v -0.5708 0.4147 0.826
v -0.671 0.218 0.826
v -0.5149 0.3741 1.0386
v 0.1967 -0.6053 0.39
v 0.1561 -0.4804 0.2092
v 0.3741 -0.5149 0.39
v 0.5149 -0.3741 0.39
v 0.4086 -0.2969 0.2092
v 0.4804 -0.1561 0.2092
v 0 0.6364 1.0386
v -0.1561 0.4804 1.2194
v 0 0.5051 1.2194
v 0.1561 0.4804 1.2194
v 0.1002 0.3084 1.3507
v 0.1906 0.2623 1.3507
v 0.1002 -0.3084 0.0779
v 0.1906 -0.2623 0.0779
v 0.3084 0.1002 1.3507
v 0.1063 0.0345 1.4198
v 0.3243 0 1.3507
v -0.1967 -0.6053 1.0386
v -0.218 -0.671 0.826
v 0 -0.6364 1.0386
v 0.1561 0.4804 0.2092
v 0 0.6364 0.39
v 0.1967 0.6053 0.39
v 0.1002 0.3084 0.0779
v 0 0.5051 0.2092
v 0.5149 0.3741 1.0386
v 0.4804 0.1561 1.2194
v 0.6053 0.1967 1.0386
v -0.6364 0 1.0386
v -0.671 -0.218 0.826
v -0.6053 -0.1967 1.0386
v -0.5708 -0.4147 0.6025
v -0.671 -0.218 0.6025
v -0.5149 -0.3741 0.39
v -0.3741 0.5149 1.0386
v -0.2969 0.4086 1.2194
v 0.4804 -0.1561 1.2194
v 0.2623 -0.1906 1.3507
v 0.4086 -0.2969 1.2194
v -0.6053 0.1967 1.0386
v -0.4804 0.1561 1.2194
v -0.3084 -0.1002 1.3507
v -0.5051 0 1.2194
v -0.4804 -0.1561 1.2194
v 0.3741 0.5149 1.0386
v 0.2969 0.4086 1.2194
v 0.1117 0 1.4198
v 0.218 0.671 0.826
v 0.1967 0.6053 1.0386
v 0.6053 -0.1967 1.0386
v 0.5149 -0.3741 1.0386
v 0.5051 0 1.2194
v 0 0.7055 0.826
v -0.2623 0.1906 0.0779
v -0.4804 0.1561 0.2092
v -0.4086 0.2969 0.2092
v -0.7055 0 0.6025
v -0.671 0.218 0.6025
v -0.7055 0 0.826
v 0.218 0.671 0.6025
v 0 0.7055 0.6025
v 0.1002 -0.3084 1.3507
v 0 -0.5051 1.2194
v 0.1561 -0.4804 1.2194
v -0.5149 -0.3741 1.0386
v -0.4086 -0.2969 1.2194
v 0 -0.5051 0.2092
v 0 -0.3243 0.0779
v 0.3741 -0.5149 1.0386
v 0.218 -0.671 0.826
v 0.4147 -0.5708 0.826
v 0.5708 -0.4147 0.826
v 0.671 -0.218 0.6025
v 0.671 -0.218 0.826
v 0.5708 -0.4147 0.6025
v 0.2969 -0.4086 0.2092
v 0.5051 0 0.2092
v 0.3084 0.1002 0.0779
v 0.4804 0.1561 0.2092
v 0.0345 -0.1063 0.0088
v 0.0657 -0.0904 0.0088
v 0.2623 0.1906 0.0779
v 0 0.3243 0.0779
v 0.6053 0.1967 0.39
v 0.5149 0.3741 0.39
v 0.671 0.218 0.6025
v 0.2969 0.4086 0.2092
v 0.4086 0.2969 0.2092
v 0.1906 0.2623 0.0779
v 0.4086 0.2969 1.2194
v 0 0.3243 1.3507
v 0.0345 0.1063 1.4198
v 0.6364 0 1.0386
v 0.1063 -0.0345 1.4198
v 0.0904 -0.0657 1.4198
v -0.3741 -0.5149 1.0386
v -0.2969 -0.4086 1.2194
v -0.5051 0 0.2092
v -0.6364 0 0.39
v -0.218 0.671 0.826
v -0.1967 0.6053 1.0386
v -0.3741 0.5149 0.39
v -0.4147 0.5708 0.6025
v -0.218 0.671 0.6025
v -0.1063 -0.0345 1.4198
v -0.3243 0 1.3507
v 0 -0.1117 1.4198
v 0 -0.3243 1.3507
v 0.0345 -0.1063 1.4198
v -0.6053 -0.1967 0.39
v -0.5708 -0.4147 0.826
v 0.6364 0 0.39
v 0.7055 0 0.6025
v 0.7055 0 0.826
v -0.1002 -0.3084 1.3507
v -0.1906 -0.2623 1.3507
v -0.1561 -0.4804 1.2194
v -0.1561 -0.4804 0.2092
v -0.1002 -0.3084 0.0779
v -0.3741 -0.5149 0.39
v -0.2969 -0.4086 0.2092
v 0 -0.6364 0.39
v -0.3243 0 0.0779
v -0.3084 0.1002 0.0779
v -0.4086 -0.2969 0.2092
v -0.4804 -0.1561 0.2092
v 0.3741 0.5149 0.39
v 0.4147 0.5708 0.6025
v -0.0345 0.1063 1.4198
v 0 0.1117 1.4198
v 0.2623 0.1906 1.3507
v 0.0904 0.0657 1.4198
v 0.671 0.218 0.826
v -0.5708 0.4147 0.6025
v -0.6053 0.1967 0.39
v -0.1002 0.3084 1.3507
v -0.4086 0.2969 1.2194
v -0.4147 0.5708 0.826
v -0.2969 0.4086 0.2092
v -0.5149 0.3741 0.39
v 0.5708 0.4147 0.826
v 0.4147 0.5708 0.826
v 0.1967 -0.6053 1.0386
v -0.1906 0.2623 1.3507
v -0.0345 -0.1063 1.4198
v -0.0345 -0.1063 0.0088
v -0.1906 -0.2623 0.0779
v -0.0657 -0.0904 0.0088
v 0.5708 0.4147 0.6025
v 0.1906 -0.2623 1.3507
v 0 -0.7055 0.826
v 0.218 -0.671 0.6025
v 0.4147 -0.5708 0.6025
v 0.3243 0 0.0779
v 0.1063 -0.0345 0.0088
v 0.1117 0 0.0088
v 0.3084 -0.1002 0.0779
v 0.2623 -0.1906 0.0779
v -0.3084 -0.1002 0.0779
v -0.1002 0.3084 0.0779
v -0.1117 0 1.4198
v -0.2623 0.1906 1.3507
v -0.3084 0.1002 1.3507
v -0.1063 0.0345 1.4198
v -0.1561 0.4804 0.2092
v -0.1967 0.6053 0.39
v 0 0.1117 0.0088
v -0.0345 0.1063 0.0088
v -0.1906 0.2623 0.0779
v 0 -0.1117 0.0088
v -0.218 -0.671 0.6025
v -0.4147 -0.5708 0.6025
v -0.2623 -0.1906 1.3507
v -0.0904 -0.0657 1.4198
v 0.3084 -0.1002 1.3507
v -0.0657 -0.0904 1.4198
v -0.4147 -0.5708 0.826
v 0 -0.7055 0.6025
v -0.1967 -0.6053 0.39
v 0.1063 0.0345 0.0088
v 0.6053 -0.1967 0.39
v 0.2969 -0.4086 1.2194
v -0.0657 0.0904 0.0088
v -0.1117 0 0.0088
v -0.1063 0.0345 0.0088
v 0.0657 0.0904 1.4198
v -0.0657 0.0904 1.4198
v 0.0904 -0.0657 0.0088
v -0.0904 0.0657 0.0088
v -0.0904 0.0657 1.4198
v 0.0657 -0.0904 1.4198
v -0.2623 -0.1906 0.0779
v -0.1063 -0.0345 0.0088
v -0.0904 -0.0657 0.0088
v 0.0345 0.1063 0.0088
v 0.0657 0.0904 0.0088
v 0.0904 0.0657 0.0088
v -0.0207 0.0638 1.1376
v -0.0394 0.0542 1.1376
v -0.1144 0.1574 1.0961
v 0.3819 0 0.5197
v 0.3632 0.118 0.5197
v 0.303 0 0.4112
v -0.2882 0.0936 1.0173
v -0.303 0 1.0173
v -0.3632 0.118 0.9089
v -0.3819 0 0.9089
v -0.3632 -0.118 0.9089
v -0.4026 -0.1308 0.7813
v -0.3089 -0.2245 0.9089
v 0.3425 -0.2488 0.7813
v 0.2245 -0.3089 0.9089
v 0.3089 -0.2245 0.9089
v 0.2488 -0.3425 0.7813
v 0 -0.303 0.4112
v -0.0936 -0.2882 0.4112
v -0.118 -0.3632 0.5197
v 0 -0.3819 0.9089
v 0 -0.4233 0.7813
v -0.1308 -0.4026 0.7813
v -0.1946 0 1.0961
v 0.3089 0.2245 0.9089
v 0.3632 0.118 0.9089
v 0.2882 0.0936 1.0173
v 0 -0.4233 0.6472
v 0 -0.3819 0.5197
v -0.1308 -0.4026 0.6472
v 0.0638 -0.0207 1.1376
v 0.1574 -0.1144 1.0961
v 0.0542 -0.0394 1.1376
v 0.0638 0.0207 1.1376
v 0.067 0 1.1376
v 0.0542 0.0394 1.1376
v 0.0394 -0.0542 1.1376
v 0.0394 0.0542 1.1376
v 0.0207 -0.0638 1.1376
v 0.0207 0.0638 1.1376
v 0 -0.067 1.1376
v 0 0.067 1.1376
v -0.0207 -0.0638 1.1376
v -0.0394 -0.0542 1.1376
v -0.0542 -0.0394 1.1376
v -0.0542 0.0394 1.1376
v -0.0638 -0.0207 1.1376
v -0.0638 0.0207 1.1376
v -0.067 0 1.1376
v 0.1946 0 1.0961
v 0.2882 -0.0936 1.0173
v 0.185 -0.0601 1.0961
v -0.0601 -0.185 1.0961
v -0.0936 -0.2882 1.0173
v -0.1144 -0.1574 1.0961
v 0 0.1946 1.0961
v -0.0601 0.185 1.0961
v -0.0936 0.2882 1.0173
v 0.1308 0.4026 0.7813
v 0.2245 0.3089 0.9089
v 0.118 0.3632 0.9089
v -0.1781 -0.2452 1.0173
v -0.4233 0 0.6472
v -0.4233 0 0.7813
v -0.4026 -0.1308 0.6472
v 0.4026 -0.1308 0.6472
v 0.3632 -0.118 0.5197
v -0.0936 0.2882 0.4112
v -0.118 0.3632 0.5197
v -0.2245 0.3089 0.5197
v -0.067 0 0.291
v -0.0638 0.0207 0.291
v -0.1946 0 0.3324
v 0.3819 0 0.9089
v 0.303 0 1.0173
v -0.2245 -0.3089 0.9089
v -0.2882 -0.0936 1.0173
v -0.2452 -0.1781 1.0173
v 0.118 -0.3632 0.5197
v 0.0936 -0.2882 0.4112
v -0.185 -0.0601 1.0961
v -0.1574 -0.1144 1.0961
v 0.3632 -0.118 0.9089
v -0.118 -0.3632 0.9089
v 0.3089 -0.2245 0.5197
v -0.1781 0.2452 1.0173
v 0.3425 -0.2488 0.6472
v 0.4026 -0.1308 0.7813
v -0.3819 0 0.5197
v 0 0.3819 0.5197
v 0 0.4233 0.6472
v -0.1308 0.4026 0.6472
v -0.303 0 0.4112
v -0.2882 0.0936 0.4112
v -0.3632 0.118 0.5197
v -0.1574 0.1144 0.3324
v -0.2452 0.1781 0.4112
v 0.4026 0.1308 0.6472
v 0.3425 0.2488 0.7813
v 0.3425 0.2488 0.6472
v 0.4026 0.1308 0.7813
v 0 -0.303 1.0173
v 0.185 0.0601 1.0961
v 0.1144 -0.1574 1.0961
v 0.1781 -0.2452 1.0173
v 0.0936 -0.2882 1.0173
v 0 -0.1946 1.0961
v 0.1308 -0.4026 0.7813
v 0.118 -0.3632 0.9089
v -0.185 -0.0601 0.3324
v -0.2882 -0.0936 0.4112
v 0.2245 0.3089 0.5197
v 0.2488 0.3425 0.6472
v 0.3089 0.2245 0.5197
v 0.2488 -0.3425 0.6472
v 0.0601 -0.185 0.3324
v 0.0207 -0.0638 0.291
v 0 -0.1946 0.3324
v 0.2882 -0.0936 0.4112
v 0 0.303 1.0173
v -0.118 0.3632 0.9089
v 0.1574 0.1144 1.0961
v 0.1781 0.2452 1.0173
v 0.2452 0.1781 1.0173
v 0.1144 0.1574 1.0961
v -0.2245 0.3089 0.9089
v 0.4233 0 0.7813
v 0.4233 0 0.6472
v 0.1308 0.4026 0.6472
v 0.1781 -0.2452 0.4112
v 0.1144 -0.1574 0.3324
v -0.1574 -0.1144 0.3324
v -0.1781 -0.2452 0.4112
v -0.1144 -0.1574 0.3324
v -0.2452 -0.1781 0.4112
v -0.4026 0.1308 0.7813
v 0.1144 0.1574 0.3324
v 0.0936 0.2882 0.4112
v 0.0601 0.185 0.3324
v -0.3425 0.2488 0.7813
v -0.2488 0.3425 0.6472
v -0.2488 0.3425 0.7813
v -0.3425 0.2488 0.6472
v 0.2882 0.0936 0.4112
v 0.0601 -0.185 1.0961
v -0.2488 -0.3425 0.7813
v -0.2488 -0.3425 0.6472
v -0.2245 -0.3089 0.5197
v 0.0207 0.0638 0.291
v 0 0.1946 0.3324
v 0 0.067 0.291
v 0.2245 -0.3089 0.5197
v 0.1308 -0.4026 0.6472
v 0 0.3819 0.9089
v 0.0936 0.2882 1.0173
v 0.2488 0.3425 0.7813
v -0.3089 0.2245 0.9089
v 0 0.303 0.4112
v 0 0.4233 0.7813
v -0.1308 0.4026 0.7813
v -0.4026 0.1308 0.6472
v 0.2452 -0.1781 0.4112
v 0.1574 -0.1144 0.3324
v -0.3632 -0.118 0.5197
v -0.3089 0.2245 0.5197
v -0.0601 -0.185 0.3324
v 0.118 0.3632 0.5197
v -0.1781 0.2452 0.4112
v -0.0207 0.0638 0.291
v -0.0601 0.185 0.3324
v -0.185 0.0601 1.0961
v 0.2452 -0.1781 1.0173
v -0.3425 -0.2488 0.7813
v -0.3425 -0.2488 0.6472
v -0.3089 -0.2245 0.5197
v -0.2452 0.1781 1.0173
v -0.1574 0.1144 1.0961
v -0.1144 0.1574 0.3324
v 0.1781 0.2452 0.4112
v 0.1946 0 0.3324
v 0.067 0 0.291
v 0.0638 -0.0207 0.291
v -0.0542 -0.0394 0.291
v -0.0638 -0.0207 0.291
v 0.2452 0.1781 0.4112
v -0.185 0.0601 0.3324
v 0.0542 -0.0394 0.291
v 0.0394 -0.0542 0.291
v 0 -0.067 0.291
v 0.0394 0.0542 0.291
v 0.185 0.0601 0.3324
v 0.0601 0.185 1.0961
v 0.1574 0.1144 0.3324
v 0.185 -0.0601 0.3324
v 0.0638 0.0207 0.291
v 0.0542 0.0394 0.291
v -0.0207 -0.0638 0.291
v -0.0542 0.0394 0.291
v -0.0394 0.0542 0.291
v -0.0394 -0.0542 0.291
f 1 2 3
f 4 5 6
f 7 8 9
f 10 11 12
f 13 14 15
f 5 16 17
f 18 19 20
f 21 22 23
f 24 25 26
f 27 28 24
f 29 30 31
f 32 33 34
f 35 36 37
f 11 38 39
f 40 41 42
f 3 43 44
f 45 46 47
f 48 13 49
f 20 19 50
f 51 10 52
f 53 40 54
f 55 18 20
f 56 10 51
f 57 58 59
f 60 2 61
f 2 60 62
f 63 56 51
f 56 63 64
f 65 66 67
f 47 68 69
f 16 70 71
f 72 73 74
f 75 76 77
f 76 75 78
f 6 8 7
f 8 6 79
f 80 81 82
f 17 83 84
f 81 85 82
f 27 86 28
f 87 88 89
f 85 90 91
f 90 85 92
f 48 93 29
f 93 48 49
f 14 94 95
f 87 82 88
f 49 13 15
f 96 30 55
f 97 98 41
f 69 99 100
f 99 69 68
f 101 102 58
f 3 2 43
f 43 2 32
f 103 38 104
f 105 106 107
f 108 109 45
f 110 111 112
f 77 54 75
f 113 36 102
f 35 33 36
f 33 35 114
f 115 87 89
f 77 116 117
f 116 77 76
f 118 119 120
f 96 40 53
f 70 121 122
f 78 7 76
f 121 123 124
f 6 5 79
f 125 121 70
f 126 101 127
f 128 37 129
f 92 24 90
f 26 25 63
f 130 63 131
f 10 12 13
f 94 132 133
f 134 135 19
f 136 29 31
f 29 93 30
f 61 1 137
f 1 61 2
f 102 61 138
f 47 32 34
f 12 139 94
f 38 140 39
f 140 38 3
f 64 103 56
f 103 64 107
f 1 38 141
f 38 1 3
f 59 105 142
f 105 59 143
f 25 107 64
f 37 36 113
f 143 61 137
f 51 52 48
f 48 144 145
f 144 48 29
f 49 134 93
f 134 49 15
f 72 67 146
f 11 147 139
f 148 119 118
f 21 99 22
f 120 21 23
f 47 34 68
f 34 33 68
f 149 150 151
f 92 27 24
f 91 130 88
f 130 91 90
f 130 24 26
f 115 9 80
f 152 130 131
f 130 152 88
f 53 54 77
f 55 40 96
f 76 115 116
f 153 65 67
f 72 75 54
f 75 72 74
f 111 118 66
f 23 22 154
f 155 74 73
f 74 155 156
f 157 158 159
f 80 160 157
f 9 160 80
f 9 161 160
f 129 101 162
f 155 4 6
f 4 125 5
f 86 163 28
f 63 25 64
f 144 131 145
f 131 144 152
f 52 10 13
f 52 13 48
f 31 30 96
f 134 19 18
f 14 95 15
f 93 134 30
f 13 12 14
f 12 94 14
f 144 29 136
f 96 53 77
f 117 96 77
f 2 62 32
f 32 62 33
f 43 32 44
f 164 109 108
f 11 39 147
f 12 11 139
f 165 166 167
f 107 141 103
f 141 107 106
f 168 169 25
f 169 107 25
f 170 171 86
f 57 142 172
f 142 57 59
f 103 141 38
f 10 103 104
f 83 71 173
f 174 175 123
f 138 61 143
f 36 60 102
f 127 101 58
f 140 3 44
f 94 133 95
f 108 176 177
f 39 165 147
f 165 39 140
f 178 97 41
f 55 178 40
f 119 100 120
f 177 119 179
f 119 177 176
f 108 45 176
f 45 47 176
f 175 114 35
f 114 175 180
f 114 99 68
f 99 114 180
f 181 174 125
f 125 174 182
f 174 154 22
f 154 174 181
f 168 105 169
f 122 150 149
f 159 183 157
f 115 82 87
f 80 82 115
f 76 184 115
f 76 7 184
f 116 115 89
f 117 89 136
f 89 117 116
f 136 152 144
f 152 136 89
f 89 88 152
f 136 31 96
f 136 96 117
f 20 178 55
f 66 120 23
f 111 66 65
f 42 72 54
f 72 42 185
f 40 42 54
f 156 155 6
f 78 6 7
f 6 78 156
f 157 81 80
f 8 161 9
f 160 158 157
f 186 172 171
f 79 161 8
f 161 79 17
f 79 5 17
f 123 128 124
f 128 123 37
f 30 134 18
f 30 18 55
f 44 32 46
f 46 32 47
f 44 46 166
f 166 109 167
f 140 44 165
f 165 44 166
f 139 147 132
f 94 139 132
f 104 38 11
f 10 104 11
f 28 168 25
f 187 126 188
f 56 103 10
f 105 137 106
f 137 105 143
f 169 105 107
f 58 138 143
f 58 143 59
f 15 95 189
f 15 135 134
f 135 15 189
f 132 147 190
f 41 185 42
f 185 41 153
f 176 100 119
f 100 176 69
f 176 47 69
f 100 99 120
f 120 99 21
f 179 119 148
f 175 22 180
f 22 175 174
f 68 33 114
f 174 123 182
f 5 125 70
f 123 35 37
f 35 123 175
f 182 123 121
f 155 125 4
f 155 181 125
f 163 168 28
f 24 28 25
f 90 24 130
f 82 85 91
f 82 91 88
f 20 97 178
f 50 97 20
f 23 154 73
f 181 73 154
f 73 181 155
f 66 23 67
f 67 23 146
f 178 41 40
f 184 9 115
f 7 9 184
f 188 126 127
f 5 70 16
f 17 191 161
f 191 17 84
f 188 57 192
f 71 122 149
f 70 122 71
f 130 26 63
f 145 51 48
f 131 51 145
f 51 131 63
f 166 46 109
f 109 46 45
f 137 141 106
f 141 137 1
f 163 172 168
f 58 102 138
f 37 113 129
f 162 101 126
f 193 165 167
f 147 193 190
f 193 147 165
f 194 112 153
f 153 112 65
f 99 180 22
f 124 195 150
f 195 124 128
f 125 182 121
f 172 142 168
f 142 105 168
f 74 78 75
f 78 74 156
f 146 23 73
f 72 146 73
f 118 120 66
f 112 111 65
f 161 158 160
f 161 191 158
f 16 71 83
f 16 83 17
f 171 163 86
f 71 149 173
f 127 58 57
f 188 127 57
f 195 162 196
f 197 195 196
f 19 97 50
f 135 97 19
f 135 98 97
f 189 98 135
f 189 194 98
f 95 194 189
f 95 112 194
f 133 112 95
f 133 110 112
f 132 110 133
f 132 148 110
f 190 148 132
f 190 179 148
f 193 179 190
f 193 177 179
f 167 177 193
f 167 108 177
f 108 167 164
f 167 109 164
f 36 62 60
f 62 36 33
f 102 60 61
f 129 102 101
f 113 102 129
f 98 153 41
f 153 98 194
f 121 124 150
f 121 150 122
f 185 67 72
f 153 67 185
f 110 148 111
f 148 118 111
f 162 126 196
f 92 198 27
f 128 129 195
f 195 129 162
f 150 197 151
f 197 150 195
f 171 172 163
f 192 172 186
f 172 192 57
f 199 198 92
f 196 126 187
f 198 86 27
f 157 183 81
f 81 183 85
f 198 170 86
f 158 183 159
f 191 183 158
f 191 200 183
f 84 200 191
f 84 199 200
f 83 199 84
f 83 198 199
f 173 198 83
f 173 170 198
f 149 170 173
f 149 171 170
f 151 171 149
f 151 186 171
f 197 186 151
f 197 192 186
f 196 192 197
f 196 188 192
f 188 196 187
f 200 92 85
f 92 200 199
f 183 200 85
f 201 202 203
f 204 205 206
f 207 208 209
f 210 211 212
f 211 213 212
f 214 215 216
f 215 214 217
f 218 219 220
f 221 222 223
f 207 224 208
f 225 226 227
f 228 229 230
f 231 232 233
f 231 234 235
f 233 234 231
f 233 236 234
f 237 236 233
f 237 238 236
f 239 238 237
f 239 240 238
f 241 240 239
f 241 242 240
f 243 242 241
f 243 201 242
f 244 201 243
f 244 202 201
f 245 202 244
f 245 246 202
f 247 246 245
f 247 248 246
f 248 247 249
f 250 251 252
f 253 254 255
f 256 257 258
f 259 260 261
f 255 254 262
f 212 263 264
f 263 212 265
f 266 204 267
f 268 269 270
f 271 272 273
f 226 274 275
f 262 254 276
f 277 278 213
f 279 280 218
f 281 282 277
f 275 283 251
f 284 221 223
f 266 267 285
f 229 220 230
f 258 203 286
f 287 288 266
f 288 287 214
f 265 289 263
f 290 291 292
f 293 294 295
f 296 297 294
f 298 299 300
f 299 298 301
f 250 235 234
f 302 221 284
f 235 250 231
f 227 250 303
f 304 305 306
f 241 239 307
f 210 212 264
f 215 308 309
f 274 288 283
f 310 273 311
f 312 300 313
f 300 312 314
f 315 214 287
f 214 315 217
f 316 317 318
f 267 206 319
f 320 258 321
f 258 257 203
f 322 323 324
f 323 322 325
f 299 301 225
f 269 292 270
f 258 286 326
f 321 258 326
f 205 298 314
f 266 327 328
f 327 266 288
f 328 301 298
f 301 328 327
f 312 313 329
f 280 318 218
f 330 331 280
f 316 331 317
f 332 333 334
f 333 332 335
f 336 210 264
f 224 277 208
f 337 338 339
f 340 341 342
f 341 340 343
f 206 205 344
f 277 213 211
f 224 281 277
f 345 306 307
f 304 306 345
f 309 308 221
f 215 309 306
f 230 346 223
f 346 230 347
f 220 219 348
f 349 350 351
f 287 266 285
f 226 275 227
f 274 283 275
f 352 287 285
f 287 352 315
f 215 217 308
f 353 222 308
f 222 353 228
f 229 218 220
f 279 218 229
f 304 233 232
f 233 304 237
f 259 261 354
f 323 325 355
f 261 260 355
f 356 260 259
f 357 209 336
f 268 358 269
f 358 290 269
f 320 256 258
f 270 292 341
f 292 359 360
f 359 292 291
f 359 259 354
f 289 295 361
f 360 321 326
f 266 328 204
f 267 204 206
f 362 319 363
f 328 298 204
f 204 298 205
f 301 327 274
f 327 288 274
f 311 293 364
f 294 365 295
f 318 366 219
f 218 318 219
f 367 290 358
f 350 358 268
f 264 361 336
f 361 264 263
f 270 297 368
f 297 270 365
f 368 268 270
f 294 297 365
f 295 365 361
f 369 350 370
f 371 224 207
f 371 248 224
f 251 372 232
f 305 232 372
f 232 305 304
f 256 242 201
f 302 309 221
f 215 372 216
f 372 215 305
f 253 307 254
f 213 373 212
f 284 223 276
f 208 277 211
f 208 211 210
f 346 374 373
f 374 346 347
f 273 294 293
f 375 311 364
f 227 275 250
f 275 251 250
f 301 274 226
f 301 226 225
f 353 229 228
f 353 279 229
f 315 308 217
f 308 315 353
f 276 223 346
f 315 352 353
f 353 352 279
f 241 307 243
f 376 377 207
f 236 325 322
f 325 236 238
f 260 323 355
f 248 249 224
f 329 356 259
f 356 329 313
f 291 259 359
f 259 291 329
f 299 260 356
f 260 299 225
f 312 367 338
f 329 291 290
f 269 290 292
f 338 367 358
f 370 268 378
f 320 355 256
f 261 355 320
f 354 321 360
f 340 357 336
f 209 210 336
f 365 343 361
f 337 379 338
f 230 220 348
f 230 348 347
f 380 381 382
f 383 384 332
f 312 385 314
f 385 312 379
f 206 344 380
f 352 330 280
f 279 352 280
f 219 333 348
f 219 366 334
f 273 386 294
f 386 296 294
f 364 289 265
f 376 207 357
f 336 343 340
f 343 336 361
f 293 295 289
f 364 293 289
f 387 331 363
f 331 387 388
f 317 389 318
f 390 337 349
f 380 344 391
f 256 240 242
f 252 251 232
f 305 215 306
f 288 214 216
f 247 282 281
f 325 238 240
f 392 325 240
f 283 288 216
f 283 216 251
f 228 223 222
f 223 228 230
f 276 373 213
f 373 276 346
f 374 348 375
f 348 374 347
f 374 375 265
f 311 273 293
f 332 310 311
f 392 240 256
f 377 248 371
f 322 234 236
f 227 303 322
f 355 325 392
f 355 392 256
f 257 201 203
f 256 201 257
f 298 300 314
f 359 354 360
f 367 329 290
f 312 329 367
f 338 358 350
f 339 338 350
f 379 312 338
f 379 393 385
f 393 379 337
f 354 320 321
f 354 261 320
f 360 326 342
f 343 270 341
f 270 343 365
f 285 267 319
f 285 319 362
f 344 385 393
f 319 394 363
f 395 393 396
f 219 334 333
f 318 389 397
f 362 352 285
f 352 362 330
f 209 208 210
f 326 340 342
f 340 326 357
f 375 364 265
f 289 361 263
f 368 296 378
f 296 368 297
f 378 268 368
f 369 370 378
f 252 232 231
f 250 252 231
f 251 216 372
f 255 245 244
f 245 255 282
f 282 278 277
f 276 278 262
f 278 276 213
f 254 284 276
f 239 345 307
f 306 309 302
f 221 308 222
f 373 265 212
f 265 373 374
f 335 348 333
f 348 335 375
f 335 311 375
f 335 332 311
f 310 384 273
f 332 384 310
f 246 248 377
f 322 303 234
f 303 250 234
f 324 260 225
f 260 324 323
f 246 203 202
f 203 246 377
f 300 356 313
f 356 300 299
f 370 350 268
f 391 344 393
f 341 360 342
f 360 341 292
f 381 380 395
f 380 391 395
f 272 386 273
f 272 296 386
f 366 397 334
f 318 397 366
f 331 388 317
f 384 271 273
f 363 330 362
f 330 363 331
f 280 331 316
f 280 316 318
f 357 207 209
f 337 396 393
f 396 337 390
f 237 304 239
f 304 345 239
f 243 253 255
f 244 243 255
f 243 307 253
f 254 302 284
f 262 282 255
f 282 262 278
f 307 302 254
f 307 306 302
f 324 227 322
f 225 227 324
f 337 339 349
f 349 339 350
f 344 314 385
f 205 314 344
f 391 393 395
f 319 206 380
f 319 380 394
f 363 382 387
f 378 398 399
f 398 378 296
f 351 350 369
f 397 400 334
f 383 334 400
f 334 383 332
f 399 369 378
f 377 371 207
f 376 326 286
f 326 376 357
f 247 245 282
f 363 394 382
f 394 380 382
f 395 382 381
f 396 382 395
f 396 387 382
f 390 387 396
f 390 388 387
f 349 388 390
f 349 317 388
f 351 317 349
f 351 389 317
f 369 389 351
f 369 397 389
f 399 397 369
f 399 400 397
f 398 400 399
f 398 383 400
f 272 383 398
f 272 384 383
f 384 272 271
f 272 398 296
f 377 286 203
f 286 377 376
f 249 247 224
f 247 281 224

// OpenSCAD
scale(5/7,5/7,5/7){
translate([0,0,1])
difference(){
sphere(r=1,$fn=20);
sphere(r=0.6,$fn=20);
}
}
